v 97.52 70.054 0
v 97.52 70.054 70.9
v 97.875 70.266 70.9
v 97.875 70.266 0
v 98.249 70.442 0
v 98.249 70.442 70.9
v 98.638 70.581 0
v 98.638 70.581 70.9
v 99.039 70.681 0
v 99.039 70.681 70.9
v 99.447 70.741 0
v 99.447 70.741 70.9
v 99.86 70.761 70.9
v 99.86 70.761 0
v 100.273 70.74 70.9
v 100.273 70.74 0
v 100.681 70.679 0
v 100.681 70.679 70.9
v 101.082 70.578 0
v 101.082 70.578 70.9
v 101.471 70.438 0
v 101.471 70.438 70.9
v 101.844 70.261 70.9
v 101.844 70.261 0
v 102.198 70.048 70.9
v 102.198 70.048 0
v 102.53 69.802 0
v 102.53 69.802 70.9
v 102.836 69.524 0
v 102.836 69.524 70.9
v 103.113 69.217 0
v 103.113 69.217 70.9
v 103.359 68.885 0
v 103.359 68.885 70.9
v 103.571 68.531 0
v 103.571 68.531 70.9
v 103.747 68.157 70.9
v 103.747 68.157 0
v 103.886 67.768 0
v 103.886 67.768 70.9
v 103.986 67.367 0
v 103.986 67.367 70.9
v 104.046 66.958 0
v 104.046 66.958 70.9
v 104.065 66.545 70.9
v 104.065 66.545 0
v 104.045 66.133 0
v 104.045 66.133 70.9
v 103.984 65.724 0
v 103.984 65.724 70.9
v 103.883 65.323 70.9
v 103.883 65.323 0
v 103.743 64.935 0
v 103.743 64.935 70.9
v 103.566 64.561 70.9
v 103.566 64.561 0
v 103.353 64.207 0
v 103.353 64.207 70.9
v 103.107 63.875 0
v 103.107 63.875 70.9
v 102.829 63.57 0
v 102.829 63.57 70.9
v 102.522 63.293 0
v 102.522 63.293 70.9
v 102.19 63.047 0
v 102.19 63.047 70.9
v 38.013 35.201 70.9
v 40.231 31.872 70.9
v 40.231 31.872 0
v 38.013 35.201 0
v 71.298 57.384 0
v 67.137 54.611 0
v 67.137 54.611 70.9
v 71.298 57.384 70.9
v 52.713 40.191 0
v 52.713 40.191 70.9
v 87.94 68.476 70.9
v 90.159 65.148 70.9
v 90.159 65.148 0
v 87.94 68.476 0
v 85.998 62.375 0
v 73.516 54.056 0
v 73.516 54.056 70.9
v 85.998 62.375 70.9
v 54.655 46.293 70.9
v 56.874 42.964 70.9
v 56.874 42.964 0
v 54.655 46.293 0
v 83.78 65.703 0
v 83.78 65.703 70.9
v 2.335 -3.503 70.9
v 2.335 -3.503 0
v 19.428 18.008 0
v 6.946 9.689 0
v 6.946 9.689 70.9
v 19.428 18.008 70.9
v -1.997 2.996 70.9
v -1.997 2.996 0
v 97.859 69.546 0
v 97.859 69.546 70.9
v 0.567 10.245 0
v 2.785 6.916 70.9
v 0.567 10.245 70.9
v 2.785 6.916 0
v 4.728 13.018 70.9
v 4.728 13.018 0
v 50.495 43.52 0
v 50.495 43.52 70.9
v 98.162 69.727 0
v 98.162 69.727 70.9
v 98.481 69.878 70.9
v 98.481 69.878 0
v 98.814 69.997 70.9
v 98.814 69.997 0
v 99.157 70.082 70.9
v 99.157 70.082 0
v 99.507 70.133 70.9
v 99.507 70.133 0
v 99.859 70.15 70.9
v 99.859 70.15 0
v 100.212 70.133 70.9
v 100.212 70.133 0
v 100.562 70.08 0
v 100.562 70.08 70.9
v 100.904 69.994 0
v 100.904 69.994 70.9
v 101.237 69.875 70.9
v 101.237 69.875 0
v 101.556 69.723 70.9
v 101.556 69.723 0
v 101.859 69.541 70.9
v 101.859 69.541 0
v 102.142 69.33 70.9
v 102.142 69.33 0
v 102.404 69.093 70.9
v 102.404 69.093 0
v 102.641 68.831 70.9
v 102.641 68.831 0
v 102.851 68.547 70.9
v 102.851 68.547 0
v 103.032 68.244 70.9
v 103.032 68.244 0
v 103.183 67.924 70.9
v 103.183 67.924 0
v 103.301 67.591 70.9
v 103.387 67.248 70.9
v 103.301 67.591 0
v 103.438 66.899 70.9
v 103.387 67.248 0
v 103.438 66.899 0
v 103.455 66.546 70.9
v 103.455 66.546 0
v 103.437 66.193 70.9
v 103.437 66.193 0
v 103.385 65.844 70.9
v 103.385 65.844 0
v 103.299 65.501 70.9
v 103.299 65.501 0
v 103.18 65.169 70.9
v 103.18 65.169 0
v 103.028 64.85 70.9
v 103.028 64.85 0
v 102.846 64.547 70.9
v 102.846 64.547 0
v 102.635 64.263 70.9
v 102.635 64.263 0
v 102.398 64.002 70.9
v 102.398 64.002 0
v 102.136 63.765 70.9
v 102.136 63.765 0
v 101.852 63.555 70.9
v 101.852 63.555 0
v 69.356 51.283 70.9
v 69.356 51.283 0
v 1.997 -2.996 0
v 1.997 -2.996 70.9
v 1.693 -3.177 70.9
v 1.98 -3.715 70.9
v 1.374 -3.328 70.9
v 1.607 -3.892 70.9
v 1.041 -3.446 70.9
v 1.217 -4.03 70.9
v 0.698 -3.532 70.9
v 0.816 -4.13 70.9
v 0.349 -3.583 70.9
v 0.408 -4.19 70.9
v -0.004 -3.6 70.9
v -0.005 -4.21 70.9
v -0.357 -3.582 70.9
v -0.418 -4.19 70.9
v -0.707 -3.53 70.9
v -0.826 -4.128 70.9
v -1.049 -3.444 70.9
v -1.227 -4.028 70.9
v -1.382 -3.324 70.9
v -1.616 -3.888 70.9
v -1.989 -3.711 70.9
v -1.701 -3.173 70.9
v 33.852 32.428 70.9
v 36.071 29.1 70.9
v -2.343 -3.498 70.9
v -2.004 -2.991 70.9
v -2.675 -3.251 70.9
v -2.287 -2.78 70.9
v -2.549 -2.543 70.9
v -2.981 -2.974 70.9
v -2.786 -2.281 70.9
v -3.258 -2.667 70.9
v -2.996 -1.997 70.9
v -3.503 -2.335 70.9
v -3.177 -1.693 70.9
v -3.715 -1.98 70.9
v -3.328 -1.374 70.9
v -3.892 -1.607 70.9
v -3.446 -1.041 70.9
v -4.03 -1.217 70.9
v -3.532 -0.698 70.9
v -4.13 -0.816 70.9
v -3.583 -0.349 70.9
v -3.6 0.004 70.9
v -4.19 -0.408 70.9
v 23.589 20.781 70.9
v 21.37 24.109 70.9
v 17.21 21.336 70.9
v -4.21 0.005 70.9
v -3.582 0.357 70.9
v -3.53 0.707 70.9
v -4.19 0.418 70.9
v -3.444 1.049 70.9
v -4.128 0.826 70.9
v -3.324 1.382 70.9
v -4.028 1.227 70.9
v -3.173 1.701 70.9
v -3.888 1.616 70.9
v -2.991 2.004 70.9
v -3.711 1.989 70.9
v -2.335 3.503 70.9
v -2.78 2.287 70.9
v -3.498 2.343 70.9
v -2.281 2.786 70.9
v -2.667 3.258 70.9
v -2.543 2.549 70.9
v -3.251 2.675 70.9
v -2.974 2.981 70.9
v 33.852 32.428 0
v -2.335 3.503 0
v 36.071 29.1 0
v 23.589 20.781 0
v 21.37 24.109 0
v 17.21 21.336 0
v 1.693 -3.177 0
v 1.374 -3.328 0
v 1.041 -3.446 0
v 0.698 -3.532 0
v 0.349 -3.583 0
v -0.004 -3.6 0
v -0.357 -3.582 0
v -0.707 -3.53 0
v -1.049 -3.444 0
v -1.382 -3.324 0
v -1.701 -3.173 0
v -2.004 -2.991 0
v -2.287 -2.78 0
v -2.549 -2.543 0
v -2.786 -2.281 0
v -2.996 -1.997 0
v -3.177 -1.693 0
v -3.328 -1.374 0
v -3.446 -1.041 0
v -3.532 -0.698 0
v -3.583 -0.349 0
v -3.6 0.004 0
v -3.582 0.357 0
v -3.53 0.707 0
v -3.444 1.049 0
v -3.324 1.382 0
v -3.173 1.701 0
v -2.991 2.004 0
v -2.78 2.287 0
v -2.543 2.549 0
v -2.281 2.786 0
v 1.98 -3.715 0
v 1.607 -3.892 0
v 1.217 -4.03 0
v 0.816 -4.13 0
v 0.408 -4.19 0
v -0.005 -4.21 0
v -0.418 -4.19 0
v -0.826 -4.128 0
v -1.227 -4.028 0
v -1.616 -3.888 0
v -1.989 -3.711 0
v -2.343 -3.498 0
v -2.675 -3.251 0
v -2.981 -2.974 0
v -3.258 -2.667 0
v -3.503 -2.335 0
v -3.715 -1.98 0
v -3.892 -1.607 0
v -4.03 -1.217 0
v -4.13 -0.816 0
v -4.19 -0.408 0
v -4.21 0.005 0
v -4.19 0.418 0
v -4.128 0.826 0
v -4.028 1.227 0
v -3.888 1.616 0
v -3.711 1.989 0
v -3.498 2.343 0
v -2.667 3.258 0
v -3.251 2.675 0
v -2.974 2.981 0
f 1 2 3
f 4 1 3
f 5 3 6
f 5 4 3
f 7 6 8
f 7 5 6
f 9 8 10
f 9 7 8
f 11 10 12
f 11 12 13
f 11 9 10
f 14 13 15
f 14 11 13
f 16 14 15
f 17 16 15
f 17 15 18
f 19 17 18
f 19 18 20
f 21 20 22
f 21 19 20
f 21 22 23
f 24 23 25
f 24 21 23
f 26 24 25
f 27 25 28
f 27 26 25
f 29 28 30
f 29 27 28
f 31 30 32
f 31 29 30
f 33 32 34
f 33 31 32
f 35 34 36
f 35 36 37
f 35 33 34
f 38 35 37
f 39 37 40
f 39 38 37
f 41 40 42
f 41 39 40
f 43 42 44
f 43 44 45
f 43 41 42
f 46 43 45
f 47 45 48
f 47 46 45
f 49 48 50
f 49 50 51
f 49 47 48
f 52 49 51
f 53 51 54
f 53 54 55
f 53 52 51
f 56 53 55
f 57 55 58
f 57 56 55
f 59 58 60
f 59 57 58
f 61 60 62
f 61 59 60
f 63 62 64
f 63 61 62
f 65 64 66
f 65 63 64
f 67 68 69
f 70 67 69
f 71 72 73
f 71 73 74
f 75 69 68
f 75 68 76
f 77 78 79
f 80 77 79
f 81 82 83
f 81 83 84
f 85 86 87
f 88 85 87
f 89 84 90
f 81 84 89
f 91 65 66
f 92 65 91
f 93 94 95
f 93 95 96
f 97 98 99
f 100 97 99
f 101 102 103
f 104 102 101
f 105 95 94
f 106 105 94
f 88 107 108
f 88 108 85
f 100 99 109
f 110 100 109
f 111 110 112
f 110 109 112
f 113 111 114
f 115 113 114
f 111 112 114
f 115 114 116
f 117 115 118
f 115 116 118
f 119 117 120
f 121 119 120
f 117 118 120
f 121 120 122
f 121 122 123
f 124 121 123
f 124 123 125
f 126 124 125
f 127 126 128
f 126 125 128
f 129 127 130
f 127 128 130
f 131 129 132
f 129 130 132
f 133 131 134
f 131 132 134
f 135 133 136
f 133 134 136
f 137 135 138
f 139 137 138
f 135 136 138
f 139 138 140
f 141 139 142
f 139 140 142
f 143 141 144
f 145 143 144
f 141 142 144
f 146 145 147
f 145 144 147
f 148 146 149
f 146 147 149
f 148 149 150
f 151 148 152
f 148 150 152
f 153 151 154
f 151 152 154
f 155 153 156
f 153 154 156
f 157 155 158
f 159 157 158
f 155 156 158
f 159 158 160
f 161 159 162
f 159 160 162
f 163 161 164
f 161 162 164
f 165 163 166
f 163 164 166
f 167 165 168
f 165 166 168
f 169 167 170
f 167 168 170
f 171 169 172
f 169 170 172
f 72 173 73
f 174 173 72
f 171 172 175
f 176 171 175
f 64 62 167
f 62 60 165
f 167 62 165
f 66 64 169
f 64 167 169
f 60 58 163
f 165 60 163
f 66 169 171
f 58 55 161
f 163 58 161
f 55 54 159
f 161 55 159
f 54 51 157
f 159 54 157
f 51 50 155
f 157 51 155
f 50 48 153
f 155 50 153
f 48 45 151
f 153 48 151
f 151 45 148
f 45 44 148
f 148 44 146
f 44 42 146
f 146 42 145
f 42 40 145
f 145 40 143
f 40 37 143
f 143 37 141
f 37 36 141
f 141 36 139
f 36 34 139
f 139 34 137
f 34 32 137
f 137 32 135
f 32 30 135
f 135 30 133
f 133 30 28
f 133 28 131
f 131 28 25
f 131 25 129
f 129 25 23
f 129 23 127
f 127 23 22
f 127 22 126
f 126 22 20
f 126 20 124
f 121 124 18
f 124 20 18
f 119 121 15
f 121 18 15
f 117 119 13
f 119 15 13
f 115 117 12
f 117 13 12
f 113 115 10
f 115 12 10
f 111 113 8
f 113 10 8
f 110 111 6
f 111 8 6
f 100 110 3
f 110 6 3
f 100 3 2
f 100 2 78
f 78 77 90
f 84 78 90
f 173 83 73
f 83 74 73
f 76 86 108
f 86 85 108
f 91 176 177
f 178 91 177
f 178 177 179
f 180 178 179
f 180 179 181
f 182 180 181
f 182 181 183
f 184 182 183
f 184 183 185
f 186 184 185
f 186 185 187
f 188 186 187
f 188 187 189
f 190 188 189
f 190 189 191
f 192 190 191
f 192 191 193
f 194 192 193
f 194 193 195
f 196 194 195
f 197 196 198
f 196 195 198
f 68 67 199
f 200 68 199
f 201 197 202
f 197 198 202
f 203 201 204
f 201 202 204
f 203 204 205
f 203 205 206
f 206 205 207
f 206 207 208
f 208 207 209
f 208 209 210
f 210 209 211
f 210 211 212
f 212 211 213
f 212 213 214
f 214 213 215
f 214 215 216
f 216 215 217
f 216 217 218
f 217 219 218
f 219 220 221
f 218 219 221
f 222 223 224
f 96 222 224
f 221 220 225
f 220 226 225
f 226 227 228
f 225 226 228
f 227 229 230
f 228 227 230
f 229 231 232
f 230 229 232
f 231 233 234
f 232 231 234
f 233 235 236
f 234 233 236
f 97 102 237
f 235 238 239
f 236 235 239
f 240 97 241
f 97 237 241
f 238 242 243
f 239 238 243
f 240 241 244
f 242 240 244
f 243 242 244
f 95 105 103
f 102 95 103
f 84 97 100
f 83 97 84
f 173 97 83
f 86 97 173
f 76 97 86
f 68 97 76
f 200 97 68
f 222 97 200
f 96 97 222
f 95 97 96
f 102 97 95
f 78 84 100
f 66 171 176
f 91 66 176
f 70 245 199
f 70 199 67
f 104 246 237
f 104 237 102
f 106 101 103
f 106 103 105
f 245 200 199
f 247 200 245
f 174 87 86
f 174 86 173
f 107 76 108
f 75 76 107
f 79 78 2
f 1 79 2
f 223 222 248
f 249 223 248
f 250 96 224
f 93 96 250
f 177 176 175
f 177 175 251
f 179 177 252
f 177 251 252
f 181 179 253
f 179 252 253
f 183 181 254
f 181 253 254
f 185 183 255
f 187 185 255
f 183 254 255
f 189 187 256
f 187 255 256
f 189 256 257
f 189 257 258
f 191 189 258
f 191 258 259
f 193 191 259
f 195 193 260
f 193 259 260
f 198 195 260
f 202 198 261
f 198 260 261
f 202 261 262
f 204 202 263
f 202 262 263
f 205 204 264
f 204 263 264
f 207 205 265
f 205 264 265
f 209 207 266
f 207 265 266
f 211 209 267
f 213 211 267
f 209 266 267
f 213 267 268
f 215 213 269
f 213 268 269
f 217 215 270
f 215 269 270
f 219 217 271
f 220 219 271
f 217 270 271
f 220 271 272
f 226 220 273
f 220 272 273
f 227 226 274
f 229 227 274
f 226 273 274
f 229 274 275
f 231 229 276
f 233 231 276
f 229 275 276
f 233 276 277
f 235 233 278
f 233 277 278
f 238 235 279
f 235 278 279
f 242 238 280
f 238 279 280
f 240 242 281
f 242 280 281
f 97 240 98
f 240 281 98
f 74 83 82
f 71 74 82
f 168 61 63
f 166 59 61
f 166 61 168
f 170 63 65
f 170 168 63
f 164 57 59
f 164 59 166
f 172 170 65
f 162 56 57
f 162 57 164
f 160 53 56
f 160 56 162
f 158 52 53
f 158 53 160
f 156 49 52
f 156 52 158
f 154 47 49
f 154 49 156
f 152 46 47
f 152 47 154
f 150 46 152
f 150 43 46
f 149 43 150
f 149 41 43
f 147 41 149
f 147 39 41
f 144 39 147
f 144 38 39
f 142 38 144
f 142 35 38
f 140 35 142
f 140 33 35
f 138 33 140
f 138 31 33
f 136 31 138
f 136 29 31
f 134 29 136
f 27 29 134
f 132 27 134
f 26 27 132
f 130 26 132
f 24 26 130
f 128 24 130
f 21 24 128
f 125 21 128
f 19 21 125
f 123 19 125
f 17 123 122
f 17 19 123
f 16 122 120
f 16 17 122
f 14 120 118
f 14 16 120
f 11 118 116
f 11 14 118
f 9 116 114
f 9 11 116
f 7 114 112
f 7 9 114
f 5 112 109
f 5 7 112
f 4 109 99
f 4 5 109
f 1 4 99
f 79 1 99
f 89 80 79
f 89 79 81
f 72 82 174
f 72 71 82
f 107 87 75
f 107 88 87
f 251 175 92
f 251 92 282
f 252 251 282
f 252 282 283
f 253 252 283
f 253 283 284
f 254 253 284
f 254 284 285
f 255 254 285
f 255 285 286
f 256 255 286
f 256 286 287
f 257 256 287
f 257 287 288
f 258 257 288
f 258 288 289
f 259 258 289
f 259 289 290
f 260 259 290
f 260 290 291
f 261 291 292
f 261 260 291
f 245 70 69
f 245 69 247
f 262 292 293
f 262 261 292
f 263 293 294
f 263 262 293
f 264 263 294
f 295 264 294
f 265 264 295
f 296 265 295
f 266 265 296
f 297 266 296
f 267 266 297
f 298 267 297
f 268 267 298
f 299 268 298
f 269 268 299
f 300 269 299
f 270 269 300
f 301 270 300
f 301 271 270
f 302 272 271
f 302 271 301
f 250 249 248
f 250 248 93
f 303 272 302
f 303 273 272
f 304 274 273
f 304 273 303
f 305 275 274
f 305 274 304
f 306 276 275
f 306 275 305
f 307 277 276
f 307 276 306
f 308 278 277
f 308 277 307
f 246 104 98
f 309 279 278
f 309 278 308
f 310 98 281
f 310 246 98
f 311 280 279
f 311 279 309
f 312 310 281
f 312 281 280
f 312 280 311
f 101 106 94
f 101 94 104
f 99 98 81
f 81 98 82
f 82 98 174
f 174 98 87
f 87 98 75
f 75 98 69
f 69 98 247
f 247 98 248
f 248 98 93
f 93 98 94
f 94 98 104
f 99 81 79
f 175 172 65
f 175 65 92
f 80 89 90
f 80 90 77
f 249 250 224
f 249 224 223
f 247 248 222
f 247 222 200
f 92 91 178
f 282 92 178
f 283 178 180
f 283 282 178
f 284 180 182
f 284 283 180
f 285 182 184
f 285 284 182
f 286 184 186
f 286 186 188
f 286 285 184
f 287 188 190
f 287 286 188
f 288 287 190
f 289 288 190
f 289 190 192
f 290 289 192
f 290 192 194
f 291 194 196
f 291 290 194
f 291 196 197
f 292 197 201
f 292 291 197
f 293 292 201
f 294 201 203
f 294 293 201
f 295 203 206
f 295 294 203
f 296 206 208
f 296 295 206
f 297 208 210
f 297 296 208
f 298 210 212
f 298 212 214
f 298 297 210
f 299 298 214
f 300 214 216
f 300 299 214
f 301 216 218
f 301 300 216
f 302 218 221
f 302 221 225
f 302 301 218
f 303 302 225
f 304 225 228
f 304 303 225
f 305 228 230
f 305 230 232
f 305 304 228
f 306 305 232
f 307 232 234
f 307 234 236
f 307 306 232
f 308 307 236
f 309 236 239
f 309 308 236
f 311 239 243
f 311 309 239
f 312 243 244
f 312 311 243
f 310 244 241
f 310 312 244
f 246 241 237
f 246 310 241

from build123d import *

# Parameters (mm, degrees)
BOSS_EXTRUDE1_DEPTH = 70.9
SKETCH6_W           = 5
SKETCH6_H           = 70.9
BOSS_EXTRUDE2_DEPTH = 4
LPATTERN1_COUNT     = 6
LPATTERN1_PITCH     = 20


with BuildPart() as part:
    # Sketch1 → Boss-Extrude1 (new body)
    with BuildSketch(Plane.XY):
        with BuildLine():
            Line((-2.334965582, 3.503489658), (97.520200597, 70.053814883))
            ThreePointArc((97.520200597, 70.053814883), (103.358655837, 68.885290806), (102.19013176, 63.046835566))
            Line((102.19013176, 63.046835566), (2.334965582, -3.503489658))
            ThreePointArc((2.334965582, -3.503489658), (-3.503489658, -2.334965582), (-2.334965582, 3.503489658))
        make_face()
        with BuildLine():
            Line((-1.996509757, 2.995654985), (97.858656422, 69.54598021))
            ThreePointArc((97.858656422, 69.54598021), (102.850821164, 68.546834981), (101.851675935, 63.554670239))
            Line((101.851675935, 63.554670239), (1.996509757, -2.995654985))
            ThreePointArc((1.996509757, -2.995654985), (-2.995654985, -1.996509757), (-1.996509757, 2.995654985))
        make_face(mode=Mode.SUBTRACT)
    extrude(amount=BOSS_EXTRUDE1_DEPTH)

    # Sketch6 → Boss-Extrude2 (add)
    with BuildSketch(Plane(origin=(-2.334965582, 3.503489658, 0), x_dir=(0.8321263848202342, 0.554586043536986, 0), z_dir=(-0.554586043536986, 0.8321263848202342, 0))):
        with Locations((8.653433918, -35.45)):
            Rectangle(SKETCH6_W, SKETCH6_H)
    boss_extrude2 = extrude(amount=BOSS_EXTRUDE2_DEPTH)

    # LPattern1: Boss-Extrude2 ×6
    with Locations(*[Vector(0.8321263848202339, 0.5545860435369864, 0) * (i * LPATTERN1_PITCH) for i in range(1, LPATTERN1_COUNT)]):
        add(boss_extrude2)


solid = part.part
